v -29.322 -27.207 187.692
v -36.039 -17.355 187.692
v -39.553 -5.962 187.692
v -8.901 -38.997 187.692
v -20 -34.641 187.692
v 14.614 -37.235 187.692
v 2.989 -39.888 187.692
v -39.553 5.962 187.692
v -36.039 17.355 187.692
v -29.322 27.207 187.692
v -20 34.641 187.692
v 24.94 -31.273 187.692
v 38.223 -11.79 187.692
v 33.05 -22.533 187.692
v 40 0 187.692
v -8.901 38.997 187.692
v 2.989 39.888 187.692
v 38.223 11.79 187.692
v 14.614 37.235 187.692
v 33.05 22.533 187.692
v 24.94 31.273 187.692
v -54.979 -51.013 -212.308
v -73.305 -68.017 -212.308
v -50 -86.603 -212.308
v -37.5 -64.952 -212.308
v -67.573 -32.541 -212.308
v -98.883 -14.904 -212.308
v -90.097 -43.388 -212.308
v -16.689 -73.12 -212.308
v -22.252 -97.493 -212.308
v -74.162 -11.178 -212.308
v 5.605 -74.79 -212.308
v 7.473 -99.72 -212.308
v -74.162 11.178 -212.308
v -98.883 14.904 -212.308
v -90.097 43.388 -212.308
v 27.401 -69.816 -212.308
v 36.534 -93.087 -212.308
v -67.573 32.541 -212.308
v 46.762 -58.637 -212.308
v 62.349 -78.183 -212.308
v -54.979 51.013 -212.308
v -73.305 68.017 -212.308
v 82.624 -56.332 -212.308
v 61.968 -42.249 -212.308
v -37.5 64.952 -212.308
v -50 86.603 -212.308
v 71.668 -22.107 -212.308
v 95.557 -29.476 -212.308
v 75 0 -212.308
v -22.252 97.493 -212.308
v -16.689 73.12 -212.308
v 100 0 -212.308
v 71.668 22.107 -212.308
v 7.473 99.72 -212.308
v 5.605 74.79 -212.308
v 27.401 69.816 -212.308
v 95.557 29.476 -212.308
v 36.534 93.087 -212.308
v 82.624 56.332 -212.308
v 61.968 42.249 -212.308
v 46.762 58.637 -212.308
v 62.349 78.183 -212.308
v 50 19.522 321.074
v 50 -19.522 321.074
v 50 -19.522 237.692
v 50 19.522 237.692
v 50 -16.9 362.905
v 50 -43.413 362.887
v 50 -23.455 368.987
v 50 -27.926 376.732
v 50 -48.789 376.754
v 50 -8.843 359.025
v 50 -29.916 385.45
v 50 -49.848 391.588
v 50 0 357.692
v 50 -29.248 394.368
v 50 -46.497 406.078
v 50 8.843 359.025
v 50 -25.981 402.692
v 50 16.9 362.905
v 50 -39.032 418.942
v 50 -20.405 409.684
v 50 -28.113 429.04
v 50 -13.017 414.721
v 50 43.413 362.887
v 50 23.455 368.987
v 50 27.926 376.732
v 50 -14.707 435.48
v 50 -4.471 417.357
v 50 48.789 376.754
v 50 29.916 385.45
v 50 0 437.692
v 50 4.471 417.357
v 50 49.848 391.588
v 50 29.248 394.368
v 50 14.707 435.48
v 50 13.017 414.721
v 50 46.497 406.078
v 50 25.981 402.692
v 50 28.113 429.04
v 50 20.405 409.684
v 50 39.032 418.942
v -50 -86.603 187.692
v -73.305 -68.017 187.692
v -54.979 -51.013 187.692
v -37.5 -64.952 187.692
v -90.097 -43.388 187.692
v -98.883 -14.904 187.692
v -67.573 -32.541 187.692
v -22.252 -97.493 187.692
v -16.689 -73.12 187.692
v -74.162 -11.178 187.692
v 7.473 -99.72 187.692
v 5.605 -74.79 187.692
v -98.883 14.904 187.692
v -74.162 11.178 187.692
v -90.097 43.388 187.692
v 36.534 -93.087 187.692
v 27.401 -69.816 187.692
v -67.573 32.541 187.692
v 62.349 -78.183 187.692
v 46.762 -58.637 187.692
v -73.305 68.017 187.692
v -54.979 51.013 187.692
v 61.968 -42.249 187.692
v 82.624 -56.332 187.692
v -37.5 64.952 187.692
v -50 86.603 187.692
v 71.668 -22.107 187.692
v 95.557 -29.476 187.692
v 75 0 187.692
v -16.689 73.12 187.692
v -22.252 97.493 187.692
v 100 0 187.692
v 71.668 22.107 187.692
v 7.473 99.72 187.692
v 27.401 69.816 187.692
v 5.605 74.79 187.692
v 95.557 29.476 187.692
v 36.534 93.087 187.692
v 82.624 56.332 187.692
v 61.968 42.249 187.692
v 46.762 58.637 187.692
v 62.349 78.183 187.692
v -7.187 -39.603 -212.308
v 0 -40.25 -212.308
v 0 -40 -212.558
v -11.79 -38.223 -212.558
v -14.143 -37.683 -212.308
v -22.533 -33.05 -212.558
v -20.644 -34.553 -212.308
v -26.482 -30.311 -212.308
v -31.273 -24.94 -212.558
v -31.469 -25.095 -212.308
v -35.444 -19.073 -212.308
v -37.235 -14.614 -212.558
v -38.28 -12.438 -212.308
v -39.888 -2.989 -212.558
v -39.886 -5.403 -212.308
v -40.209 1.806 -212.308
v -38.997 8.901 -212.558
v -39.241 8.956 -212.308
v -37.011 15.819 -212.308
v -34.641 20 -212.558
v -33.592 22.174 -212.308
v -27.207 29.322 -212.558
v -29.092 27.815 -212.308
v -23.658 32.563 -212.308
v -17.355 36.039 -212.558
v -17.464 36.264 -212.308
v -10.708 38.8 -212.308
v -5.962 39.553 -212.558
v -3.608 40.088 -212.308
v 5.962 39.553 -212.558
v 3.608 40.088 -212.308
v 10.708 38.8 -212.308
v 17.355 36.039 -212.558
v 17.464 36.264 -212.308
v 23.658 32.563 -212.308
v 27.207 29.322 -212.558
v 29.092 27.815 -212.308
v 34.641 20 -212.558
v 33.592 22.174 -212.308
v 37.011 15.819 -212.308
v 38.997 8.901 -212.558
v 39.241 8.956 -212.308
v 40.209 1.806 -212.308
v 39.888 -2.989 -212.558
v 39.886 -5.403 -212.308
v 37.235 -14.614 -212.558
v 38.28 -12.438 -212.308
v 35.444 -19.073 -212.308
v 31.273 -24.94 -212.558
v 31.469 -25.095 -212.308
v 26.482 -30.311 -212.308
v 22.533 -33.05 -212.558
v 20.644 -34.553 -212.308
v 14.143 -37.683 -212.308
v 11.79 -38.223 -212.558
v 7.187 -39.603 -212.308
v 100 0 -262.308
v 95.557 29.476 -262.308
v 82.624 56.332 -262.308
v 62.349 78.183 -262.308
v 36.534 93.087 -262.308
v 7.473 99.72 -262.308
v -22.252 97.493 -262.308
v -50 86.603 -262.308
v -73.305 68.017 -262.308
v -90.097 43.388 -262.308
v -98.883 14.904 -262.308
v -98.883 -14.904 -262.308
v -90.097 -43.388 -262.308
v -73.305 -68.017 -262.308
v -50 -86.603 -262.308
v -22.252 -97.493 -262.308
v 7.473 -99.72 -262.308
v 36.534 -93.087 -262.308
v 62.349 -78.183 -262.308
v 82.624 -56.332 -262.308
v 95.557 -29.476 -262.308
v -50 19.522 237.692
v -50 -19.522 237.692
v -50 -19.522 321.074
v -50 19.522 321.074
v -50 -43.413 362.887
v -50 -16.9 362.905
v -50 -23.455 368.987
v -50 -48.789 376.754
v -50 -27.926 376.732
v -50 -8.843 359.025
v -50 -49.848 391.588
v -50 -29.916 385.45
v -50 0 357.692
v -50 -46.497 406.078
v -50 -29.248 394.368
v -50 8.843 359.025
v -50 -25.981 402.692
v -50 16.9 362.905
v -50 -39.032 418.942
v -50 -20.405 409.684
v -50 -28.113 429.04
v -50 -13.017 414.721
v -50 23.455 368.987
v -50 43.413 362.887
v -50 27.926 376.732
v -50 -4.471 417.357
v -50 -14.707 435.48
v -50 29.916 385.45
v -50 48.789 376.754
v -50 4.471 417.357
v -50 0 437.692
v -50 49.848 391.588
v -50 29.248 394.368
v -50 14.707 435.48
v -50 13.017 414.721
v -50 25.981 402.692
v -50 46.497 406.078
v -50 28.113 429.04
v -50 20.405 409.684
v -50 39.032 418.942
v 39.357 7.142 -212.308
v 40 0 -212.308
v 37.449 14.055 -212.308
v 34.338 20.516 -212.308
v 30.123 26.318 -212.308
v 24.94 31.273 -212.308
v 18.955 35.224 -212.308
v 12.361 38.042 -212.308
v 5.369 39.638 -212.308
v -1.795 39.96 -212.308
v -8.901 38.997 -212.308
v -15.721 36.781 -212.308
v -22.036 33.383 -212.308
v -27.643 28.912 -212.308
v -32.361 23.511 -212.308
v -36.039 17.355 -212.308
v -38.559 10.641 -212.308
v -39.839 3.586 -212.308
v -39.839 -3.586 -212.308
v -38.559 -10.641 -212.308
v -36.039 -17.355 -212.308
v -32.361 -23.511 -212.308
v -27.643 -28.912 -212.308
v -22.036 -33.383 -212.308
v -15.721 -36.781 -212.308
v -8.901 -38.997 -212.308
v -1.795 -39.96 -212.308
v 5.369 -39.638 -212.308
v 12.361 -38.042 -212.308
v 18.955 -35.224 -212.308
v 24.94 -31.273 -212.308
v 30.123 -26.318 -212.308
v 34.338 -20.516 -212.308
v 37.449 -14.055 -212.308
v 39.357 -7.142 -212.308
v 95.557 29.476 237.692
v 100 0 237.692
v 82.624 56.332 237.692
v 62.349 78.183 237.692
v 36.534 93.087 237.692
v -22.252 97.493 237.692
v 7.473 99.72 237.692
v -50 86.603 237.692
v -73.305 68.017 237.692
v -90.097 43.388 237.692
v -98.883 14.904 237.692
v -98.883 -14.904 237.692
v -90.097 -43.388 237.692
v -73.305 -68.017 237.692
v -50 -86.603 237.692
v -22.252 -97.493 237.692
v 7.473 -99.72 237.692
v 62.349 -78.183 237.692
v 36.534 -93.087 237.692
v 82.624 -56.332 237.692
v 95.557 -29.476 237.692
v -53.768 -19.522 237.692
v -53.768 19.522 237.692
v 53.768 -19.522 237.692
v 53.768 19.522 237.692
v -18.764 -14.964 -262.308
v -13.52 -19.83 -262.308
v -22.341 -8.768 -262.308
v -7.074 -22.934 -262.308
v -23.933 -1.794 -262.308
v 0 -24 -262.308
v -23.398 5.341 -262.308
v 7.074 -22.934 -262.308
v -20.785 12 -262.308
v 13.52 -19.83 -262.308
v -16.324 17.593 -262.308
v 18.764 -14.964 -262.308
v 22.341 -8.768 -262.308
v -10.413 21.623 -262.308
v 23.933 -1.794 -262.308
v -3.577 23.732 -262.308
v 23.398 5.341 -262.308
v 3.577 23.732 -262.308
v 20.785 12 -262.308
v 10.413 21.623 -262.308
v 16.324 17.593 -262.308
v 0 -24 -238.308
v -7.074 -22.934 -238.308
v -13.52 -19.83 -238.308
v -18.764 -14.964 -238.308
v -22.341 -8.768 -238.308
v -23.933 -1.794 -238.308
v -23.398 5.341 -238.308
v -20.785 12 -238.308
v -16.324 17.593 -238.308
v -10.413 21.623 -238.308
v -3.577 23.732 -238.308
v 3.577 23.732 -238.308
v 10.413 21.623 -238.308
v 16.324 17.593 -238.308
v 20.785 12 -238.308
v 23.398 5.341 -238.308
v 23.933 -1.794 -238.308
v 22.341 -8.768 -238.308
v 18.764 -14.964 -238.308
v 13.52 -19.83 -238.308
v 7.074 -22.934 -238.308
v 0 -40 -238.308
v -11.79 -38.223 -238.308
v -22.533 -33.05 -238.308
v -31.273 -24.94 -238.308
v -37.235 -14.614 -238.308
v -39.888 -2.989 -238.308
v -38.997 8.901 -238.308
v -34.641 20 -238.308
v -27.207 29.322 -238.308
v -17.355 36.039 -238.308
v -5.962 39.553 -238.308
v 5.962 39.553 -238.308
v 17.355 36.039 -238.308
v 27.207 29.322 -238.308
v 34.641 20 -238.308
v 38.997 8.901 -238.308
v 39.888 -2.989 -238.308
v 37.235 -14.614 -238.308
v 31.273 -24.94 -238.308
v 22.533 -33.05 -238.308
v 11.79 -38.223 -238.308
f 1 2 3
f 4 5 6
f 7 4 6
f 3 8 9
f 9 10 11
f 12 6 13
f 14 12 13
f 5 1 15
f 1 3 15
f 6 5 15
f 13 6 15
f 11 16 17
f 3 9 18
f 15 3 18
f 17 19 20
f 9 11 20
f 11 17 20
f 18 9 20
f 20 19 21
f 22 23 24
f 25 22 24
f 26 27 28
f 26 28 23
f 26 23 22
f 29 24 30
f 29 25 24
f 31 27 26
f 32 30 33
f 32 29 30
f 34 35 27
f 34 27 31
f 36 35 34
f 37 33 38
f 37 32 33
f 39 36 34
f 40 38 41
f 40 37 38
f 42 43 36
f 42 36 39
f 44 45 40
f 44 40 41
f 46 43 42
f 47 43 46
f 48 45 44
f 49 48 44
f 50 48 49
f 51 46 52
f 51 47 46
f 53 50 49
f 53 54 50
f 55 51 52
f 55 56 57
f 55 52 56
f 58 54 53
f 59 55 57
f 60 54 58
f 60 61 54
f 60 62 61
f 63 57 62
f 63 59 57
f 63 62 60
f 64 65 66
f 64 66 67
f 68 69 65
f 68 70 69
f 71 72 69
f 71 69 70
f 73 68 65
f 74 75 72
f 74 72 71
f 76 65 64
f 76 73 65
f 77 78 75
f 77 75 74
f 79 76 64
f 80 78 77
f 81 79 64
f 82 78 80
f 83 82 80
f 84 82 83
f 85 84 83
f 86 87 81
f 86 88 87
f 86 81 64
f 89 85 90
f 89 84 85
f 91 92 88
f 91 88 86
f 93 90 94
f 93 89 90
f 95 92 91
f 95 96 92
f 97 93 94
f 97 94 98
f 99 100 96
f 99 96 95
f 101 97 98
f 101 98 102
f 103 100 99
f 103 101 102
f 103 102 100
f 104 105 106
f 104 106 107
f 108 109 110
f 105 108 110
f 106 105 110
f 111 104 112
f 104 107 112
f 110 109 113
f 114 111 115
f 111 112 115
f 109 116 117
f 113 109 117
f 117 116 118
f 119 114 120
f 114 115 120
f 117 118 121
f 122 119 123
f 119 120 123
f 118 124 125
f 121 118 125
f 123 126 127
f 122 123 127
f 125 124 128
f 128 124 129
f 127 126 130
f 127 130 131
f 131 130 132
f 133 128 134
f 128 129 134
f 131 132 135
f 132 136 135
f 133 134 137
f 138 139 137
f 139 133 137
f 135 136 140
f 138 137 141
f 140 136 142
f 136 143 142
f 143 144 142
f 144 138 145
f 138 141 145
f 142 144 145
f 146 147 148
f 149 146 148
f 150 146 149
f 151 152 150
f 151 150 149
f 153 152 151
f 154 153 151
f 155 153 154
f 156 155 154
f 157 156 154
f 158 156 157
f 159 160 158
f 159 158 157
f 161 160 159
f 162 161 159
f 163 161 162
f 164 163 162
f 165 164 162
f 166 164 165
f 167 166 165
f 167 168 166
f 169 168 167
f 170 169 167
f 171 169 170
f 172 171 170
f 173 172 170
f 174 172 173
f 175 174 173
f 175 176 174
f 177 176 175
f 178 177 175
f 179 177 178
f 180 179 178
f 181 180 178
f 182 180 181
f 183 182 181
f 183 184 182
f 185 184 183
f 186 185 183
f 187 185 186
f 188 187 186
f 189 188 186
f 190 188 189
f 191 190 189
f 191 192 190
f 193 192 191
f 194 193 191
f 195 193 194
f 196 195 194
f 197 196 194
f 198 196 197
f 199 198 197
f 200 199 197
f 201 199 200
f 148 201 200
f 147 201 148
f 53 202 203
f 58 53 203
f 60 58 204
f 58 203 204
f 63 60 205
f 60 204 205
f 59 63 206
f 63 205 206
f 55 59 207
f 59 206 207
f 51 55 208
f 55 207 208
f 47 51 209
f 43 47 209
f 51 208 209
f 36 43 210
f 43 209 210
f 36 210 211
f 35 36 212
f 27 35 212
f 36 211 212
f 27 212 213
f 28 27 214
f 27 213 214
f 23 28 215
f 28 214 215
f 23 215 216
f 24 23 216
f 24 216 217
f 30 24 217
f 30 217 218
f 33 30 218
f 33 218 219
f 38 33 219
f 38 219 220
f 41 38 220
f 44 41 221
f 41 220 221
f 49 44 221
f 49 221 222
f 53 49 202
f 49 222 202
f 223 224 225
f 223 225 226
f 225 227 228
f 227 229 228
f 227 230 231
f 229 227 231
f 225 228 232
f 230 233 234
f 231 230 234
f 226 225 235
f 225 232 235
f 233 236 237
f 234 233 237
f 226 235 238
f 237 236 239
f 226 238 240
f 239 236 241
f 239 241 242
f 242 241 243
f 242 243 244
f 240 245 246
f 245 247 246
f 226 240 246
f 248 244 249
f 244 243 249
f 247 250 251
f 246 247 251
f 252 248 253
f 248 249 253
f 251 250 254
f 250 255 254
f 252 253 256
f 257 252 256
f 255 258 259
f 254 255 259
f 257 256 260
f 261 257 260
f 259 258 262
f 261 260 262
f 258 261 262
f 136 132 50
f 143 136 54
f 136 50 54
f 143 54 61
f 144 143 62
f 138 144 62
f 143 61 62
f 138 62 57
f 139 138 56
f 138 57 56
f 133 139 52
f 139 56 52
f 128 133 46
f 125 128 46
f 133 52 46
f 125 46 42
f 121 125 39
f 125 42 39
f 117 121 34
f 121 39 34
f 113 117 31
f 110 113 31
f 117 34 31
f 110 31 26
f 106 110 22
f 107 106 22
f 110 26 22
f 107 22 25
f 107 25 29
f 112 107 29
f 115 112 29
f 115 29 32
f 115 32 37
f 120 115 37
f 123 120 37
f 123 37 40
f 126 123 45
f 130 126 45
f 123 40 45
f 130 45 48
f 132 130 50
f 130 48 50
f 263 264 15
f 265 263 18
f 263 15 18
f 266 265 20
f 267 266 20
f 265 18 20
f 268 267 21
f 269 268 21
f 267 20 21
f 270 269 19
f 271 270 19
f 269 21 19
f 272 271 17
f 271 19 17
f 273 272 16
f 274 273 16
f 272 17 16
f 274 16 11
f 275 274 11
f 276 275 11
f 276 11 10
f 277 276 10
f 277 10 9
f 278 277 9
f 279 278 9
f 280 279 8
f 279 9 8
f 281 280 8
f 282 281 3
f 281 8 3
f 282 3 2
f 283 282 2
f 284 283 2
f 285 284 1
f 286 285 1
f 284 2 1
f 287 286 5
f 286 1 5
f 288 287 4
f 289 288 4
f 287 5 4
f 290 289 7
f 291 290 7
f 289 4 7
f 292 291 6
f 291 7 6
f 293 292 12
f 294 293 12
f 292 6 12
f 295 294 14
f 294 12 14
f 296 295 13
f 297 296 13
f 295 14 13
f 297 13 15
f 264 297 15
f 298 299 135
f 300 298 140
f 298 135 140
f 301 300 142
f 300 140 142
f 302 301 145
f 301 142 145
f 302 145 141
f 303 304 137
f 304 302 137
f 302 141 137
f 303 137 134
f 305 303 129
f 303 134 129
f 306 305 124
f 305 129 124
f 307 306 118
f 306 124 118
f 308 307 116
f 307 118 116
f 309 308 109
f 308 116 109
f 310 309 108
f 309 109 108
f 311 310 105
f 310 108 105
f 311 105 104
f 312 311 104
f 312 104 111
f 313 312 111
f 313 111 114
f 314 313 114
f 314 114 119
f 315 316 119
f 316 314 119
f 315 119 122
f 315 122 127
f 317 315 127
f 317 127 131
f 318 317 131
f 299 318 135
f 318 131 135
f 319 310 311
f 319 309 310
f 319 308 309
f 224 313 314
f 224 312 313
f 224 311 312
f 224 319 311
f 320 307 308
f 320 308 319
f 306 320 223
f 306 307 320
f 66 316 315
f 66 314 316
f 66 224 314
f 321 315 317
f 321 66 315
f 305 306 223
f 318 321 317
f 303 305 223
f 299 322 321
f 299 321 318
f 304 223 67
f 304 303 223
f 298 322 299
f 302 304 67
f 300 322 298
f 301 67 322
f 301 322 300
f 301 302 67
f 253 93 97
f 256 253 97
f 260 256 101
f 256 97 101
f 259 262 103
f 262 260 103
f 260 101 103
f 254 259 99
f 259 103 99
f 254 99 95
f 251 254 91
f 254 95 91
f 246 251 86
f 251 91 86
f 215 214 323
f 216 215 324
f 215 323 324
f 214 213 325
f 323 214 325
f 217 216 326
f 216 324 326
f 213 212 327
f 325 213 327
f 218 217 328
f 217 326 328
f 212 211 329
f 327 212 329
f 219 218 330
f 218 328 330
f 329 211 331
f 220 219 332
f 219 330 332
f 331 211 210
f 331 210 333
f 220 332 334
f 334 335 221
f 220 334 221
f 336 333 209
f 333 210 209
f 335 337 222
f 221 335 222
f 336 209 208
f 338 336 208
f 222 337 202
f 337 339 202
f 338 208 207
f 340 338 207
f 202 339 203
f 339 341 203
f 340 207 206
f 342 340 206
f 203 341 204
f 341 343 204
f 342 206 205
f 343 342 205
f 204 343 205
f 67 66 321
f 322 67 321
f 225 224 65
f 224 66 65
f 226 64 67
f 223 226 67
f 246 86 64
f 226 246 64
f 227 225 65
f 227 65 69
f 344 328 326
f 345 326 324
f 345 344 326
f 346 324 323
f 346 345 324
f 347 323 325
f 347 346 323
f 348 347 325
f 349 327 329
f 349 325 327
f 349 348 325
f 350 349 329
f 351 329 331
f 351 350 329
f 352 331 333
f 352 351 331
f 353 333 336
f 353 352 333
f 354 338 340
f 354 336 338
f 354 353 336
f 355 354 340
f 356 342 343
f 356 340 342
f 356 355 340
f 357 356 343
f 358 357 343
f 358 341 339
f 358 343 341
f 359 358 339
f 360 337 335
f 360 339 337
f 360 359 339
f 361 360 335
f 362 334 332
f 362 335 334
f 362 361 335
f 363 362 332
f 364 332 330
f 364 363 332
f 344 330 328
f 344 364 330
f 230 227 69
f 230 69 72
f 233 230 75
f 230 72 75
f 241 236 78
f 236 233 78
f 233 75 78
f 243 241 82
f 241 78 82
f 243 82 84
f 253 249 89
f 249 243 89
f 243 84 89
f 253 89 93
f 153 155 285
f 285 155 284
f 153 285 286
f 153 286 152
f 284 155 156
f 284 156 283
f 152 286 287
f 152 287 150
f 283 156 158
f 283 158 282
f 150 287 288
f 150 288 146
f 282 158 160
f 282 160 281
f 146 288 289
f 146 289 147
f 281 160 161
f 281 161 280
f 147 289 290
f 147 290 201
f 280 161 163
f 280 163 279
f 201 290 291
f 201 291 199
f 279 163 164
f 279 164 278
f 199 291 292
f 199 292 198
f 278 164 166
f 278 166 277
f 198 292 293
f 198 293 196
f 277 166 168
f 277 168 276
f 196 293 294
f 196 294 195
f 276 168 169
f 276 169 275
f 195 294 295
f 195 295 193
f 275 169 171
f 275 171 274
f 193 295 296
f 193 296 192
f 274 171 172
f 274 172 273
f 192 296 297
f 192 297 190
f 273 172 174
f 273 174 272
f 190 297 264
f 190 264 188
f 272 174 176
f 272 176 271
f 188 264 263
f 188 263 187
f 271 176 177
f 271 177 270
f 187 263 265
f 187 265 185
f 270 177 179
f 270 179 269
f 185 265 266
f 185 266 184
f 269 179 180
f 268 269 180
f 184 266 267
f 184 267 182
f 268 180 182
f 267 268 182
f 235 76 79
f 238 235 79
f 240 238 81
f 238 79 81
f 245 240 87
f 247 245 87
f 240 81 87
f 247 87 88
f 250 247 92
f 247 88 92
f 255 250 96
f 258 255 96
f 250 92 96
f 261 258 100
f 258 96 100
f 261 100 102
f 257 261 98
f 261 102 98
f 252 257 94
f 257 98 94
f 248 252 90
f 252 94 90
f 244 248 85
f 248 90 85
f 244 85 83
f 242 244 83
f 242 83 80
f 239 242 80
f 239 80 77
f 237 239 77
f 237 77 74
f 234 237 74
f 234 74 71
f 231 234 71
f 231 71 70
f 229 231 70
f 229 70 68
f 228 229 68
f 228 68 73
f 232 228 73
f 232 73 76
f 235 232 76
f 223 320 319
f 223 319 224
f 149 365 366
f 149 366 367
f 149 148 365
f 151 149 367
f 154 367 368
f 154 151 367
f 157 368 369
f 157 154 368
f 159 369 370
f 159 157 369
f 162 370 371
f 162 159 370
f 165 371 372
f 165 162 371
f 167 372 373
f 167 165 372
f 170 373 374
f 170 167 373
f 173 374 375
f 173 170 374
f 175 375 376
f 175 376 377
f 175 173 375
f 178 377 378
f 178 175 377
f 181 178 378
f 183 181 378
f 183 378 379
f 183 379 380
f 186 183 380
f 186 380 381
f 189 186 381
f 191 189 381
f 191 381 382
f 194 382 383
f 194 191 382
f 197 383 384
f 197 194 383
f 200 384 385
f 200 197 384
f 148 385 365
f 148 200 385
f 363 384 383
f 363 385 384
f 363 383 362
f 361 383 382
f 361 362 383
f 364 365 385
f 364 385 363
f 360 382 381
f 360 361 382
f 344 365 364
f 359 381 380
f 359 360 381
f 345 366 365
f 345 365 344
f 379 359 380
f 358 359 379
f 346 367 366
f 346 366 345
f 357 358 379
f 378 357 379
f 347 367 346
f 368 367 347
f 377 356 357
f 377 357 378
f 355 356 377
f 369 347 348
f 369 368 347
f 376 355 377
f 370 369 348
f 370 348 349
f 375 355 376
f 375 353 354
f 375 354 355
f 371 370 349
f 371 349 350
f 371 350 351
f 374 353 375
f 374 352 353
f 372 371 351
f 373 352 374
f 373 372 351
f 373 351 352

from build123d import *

# Parameters (mm, degrees)
SKETCH3_R           = 10
BOSS_EXTRUDE3_DEPTH = 5
SKETCH16_R          = 7.5
BOSS_EXTRUDE7_DEPTH = 40
SKETCH19_R          = 4
CUT_EXTRUDE3_DEPTH  = 40
SKETCH20_R          = 10
BOSS_EXTRUDE8_DEPTH = 5
SKETCH21_W          = 10.753504306
SKETCH21_H          = 13.699669868
BOSS_EXTRUDE9_DEPTH = 20
CUT_EXTRUDE5_DEPTH  = 16.376752153
SKETCH25_R          = 3
CUT_EXTRUDE6_DEPTH  = 16.376752153
CUT_EXTRUDE7_DEPTH  = 10
SKETCH28_W          = 0.376752153
SKETCH28_H          = 3.904338954
CUT_EXTRUDE8_DEPTH  = 8.338161
SCALE1_SCALE        = 10


with BuildPart() as part:
    # Sketch3 → Boss-Extrude3 (new body)
    with BuildSketch(Plane.XY):
        Circle(SKETCH3_R)
    extrude(amount=BOSS_EXTRUDE3_DEPTH)

    # Sketch14 → CBORE for M4 Cheese Head Screw1 (revolve, cut)
    with BuildSketch(Plane(origin=(0, 0, 5), x_dir=(0, -1, 0), z_dir=(1, 0, 0))):
        Polygon((0, 0), (0, 8.942065486), (2.4, 7.5), (2.4, 2.6), (4, 2.6), (4, 0.025), (4.025, 0), align=None)
    revolve(axis=Axis((0, 0, 11.35), (0, 0, -1)), mode=Mode.SUBTRACT)

    # Sketch16 → Boss-Extrude7 (add)
    with BuildSketch(Plane.XY.offset(5)):
        Circle(SKETCH16_R)
    extrude(amount=BOSS_EXTRUDE7_DEPTH)

    # Sketch19 → Cut-Extrude3 (cut)
    with BuildSketch(Plane.XY.offset(45)):
        Circle(SKETCH19_R)
    extrude(amount=-CUT_EXTRUDE3_DEPTH, mode=Mode.SUBTRACT)

    # Sketch20 → Boss-Extrude8 (add)
    with BuildSketch(Plane.XY.offset(45)):
        Circle(SKETCH20_R)
    extrude(amount=BOSS_EXTRUDE8_DEPTH)

    # Sketch21 → Boss-Extrude9 (add)
    with BuildSketch(Plane.XY.offset(50)):
        Rectangle(SKETCH21_W, SKETCH21_H)
    extrude(amount=BOSS_EXTRUDE9_DEPTH)

    # Sketch24 → Cut-Extrude5 (cut, through all)
    with BuildSketch(Plane(origin=(5.376752153, 0, 0), x_dir=(0, 0, -1), z_dir=(1, 0, 0))):
        with BuildLine():
            Line((-58.338160712, 1.952169477), (-50, 1.952169477))
            Line((-50, 1.952169477), (-50, 6.849834934))
            Line((-50, 6.849834934), (-70, 6.849834934))
            Line((-70, 6.849834934), (-70, 0))
            ThreePointArc((-70, 0), (-67.509703972, 4.324509912), (-62.51944561, 4.34129588))
            Line((-62.51944561, 4.34129588), (-58.338160712, 1.952169477))
        make_face()
        with BuildLine():
            Line((-50, -6.849834934), (-50, -1.952169477))
            Line((-50, -1.952169477), (-58.338160712, -1.952169477))
            Line((-58.338160712, -1.952169477), (-62.51944561, -4.34129588))
            ThreePointArc((-62.51944561, -4.34129588), (-67.509703972, -4.324509912), (-70, 0))
            Line((-70, 0), (-70, -6.849834934))
            Line((-70, -6.849834934), (-50, -6.849834934))
        make_face()
    extrude(amount=-CUT_EXTRUDE5_DEPTH, mode=Mode.SUBTRACT)

    # Sketch25 → Cut-Extrude6 (cut, through all)
    with BuildSketch(Plane(origin=(5.376752153, 0, 0), x_dir=(0, 0, -1), z_dir=(1, 0, 0))):
        with Locations((-65, 0)):
            Circle(SKETCH25_R)
    extrude(amount=-CUT_EXTRUDE6_DEPTH, mode=Mode.SUBTRACT)

    # Sketch27 → Cut-Extrude7 (cut, symmetric)
    with BuildSketch(Plane(origin=(0, 1.952169477, 0), x_dir=(1, 0, 0), z_dir=(0, 1, 0))):
        Polygon((5, -58.338160712), (5, -71.045531856), (7.637324511, -71.045531856), (7.637324511, -50), (5.376752153, -50), (5.376752153, -58.338160712), align=None)
        Polygon((-8.147357924, -71.045531856), (-5, -71.045531856), (-5, -58.338160712), (-5.376752153, -58.338160712), (-5.376752153, -50), (-8.147357924, -50), align=None)
    extrude(amount=CUT_EXTRUDE7_DEPTH, both=True, mode=Mode.SUBTRACT)

    # Sketch28 → Cut-Extrude8 (cut)
    with BuildSketch(Plane.XY.offset(58.338160712)):
        with Locations((-5.188376076, 0)):
            Rectangle(SKETCH28_W, SKETCH28_H)
        with Locations((5.188376076, 0)):
            Rectangle(SKETCH28_W, SKETCH28_H)
    extrude(amount=-CUT_EXTRUDE8_DEPTH, mode=Mode.SUBTRACT)


with BuildPart() as part_1:
    # Scale1: scaled about (0, 0, 29.145316633)
    add(part.part.scale(SCALE1_SCALE).moved(Location((0, 0, -262.307849697))))


solid = part_1.part
